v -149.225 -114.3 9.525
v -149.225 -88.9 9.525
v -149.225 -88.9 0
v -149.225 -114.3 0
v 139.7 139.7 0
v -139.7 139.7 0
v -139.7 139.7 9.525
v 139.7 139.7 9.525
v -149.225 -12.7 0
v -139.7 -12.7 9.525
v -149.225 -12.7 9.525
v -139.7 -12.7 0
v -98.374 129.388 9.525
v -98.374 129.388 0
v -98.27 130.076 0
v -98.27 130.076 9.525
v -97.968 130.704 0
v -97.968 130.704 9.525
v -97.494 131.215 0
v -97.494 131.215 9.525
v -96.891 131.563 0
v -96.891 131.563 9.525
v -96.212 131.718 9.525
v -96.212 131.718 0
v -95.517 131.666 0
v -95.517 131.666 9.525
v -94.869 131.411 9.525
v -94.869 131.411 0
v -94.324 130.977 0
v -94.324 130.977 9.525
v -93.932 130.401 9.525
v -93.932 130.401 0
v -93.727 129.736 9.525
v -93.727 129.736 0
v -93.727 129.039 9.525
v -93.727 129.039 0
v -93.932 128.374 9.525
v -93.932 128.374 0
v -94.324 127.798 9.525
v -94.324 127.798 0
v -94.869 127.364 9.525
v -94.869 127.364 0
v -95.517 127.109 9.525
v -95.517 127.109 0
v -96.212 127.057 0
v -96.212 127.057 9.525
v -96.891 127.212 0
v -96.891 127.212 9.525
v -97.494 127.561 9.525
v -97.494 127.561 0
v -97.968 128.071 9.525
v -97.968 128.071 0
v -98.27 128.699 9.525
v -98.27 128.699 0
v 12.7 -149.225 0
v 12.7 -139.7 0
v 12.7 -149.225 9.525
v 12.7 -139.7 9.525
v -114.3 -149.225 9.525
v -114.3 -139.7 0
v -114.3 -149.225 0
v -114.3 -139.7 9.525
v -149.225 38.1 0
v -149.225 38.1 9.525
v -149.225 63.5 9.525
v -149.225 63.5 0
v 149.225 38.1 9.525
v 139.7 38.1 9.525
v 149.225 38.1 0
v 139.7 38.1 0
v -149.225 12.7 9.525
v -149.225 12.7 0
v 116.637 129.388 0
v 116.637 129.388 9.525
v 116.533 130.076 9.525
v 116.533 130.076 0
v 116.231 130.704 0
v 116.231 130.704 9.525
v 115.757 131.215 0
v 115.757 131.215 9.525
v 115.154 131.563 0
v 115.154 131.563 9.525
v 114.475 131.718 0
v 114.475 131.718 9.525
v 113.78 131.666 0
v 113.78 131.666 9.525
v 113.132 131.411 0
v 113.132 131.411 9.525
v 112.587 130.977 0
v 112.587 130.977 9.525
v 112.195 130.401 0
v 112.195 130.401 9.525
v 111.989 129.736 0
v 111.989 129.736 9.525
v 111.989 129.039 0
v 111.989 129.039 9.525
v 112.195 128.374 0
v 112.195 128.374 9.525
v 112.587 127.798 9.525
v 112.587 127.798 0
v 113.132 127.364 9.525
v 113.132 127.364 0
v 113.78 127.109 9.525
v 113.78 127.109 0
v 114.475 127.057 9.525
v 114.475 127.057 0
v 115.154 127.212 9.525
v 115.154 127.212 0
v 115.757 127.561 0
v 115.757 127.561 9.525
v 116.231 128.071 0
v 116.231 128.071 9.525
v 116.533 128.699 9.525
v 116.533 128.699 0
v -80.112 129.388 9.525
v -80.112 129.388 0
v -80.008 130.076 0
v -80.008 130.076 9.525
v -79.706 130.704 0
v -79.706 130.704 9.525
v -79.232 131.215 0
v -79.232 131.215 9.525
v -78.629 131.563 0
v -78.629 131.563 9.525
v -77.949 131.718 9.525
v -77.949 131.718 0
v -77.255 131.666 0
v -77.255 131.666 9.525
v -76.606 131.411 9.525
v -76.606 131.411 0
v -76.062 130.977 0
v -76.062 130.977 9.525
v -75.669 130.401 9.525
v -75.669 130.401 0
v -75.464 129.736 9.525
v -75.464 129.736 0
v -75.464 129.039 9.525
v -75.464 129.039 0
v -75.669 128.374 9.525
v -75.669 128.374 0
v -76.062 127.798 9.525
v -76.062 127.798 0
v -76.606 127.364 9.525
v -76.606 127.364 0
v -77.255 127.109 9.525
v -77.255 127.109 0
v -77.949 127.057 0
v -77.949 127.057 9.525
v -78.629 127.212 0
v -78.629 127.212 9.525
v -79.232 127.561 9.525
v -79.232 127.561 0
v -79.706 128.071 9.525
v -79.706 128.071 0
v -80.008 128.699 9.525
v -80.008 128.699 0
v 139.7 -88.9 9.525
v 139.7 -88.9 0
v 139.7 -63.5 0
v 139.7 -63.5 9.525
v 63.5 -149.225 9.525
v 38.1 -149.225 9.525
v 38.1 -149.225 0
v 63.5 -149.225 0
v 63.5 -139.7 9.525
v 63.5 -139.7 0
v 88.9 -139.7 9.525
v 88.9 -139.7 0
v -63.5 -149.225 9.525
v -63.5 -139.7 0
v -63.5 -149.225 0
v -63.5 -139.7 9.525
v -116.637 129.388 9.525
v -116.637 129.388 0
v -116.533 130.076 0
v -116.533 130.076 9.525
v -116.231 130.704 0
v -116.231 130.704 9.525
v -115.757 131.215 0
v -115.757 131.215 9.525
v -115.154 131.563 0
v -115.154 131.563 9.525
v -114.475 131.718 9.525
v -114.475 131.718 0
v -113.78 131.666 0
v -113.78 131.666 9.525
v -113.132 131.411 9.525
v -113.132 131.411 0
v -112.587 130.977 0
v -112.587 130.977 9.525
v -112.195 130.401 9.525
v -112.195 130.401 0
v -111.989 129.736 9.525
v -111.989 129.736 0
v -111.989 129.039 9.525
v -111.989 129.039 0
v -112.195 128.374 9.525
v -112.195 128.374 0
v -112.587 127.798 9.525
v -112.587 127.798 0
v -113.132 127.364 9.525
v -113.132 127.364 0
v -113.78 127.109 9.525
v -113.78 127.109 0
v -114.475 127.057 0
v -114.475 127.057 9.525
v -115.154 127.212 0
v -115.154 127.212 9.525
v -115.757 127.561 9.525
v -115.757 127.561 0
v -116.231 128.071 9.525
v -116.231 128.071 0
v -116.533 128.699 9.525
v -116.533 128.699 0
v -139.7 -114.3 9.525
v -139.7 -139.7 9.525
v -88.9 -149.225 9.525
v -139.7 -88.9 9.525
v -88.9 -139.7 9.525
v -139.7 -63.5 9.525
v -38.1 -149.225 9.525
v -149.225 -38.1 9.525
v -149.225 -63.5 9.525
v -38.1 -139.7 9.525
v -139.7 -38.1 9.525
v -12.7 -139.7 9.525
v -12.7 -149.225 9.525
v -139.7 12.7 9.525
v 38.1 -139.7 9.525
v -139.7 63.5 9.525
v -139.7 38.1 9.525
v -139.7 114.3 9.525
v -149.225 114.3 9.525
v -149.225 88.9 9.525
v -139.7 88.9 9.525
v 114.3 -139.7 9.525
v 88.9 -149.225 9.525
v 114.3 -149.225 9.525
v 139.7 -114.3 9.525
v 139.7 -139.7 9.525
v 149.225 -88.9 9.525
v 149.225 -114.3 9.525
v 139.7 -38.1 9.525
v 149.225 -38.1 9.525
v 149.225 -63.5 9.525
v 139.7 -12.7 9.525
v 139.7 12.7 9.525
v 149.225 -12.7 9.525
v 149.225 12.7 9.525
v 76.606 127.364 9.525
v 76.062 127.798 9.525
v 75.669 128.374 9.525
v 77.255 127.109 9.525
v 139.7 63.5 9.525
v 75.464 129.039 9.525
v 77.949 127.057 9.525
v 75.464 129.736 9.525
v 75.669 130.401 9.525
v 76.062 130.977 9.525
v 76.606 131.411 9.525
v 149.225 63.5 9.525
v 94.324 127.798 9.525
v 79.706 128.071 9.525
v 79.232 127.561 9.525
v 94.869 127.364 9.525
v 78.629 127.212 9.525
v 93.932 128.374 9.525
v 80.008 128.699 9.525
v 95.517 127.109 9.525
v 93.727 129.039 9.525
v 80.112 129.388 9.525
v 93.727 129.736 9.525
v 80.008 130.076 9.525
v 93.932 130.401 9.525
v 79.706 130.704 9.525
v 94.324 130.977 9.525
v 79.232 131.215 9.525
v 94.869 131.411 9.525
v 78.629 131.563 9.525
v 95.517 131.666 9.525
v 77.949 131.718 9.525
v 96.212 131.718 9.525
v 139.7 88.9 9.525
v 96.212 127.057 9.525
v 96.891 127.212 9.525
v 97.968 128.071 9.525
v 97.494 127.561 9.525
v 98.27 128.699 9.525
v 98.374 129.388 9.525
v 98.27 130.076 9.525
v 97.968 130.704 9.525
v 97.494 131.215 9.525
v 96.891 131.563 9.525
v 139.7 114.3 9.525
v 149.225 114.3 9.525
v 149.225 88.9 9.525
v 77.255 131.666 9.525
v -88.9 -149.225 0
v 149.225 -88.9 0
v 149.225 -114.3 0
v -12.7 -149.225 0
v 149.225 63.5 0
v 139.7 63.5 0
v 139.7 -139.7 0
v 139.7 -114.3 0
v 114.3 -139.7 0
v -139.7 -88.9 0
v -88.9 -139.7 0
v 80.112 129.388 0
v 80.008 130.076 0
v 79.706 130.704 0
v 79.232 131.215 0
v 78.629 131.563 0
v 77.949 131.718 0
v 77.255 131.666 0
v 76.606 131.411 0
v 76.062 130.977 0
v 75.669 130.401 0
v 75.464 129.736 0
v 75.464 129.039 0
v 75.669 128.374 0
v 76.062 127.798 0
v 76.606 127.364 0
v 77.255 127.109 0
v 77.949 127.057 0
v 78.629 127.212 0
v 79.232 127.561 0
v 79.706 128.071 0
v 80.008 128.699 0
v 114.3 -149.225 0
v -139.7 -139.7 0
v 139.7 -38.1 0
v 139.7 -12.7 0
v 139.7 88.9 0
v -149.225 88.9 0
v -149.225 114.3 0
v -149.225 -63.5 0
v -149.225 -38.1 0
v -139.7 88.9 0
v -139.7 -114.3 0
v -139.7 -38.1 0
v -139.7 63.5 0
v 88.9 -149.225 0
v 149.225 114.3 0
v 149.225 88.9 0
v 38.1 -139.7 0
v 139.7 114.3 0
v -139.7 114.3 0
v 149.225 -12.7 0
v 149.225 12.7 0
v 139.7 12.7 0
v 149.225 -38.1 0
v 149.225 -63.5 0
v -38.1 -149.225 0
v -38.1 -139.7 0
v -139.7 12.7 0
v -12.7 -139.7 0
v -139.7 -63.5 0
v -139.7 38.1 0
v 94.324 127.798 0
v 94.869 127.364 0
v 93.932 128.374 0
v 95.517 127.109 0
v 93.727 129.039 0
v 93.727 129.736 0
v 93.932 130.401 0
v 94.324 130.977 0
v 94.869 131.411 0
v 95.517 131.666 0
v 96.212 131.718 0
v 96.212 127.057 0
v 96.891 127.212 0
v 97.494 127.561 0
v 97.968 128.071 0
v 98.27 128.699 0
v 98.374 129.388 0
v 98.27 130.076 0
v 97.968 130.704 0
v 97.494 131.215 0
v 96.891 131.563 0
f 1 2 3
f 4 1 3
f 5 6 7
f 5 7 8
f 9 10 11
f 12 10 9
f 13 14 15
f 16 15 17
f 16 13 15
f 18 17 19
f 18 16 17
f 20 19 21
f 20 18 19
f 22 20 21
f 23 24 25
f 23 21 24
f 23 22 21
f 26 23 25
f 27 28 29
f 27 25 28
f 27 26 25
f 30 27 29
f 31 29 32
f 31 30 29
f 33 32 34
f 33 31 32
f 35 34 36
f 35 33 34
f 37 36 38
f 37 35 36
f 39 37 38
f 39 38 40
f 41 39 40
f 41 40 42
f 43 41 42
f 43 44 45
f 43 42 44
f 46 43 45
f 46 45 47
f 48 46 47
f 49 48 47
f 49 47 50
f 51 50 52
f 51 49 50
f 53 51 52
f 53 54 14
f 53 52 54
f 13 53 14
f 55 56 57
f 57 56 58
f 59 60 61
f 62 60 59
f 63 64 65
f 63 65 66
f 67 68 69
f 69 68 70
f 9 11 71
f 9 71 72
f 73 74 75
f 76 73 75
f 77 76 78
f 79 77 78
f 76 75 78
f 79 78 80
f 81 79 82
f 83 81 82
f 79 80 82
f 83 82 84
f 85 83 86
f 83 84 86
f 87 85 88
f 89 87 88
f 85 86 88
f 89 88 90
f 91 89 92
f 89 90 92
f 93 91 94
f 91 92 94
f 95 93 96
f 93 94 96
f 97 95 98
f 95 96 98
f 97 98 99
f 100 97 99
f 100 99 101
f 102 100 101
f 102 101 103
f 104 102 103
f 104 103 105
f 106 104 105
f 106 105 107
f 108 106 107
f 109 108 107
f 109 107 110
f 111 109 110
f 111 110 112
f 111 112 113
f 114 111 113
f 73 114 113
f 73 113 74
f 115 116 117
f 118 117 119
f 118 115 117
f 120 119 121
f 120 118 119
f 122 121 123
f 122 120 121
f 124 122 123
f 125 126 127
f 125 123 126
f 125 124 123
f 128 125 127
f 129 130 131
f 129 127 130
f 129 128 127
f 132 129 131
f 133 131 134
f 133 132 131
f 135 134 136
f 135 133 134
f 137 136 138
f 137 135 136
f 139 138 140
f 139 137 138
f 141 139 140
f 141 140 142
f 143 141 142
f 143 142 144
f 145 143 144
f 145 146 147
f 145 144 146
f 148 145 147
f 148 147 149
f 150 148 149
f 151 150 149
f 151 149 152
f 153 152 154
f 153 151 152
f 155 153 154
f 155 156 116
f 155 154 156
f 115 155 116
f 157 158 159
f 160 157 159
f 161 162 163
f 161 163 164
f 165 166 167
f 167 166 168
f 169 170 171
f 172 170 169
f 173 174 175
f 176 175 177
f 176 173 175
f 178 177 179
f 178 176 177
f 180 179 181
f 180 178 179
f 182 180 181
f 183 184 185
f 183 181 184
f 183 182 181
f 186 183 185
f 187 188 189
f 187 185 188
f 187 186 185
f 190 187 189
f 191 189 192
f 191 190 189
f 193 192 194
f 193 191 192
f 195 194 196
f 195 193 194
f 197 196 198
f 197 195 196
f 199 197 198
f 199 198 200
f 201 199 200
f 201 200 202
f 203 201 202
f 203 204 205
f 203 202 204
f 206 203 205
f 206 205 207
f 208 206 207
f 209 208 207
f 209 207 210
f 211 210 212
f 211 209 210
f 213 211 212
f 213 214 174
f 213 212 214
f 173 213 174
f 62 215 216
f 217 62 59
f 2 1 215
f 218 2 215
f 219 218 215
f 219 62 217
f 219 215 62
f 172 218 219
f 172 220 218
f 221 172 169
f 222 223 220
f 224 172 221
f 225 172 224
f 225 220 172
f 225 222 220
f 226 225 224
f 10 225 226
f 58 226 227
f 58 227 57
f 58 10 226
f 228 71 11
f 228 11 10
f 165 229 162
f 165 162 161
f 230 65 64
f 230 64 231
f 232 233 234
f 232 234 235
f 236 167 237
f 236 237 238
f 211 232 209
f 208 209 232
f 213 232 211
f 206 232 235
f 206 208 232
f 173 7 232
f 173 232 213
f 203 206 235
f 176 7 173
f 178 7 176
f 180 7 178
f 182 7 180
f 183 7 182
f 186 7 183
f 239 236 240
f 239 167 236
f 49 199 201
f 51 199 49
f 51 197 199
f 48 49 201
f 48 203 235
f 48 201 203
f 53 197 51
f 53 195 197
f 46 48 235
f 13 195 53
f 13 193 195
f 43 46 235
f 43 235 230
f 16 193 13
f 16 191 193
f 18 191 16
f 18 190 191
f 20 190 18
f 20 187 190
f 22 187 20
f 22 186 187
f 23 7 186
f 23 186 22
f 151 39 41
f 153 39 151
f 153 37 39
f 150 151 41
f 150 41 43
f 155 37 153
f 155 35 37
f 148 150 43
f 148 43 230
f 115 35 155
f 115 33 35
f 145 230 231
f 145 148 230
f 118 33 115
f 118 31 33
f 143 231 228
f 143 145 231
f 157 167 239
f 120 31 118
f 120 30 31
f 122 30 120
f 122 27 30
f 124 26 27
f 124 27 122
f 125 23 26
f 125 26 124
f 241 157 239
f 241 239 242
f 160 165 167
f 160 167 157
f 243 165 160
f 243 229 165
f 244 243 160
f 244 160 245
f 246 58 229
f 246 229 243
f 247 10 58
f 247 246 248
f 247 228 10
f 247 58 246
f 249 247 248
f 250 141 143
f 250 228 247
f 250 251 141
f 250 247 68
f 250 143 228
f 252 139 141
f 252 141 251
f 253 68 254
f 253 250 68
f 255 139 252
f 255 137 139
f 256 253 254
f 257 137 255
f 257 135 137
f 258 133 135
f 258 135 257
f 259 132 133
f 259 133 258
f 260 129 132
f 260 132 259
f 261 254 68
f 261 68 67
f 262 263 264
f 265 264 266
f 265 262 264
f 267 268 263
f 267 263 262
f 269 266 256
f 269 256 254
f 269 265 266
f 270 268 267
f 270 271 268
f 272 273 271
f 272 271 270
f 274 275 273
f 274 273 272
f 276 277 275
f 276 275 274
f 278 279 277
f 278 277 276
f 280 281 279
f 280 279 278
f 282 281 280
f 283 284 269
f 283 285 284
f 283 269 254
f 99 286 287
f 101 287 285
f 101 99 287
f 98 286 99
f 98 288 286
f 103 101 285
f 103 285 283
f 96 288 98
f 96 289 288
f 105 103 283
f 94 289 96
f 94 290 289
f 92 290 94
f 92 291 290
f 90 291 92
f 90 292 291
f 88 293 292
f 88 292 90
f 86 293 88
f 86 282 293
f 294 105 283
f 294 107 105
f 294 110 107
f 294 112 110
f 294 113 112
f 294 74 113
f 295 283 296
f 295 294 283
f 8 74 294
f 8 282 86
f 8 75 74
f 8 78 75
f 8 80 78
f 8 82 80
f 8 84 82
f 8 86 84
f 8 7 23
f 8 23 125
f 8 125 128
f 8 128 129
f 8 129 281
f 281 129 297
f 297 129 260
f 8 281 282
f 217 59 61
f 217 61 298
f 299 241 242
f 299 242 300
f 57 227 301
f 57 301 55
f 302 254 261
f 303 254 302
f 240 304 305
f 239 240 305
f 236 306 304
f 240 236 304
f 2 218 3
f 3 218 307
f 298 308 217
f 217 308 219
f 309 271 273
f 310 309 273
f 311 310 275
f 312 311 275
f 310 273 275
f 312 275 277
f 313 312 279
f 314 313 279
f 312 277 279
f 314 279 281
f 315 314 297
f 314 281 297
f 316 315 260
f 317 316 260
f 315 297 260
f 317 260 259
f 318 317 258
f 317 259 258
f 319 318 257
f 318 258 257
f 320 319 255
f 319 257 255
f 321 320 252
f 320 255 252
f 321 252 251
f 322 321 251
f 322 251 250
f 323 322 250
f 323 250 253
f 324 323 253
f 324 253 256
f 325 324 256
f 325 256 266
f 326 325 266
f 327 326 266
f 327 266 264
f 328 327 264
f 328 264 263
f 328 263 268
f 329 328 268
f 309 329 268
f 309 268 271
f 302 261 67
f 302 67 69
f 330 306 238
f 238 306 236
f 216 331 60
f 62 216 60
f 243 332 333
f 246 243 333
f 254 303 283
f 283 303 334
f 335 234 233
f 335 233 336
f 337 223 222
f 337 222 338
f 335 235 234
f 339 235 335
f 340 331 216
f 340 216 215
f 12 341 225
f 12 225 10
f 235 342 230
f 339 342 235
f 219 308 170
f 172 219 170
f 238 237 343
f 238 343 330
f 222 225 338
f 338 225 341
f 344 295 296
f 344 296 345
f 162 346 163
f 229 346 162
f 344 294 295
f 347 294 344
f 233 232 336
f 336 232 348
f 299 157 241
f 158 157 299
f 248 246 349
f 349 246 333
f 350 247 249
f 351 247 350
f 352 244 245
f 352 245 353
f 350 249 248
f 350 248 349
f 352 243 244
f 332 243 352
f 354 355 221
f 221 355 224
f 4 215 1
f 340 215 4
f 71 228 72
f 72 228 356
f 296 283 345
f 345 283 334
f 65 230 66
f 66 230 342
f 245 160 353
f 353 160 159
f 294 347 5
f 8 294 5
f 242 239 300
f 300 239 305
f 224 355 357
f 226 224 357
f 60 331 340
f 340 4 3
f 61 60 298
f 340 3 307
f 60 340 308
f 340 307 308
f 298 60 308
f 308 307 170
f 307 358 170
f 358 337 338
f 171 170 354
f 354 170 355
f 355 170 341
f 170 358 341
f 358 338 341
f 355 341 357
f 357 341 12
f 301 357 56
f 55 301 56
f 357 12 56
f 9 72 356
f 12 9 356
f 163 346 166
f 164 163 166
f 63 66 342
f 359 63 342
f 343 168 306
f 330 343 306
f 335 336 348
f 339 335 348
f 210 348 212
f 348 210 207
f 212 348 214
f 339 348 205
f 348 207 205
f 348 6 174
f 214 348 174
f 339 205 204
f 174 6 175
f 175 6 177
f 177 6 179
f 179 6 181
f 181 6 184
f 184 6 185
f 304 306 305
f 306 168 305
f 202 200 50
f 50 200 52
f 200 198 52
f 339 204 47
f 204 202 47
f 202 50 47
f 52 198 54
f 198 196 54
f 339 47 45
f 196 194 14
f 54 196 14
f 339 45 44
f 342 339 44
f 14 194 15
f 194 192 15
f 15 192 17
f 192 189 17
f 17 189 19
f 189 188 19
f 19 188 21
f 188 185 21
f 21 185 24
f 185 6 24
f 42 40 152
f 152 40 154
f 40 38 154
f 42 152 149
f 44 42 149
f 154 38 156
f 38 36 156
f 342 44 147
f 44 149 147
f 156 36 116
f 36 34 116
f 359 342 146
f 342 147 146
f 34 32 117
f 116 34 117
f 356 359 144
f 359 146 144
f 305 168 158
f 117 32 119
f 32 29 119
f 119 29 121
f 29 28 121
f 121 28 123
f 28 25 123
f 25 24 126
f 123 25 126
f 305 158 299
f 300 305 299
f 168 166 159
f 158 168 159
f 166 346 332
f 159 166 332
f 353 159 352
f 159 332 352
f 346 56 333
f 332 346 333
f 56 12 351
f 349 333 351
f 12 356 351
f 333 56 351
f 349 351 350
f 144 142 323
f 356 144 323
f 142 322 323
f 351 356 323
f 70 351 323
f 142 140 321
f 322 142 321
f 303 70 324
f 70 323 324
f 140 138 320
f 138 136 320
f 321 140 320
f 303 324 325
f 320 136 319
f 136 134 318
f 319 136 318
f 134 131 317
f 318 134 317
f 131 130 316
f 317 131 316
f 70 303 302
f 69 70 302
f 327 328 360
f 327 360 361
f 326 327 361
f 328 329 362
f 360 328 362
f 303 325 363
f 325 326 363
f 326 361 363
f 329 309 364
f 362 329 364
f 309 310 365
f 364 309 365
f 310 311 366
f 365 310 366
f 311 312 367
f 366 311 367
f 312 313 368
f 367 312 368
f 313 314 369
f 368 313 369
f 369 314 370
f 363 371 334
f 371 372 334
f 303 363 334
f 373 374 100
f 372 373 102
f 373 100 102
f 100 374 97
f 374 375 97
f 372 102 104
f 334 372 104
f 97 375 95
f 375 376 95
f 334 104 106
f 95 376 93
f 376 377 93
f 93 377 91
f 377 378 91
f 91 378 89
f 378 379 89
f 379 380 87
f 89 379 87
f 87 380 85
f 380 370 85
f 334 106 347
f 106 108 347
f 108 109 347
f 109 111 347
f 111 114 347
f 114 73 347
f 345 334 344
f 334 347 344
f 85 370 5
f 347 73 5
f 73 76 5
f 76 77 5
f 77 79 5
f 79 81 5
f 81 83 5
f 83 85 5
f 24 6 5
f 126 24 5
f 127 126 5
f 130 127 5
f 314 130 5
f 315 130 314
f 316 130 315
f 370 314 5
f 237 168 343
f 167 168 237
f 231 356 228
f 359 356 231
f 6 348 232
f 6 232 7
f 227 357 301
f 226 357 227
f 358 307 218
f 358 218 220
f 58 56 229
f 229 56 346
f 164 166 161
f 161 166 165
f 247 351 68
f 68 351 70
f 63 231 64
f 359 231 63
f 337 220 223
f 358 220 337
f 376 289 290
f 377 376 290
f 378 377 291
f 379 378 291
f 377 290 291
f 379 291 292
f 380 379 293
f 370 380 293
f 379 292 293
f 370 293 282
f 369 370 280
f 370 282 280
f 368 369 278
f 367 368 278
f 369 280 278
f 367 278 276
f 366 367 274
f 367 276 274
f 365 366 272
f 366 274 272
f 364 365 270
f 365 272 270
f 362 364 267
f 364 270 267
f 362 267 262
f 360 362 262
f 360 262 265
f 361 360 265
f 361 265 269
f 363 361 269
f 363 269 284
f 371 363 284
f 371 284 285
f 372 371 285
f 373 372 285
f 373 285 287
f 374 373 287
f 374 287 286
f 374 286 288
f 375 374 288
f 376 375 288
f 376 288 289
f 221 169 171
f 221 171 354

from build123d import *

# Parameters (mm, degrees)
SKETCH2_W               = 279.4
SKETCH2_H               = 279.4
BOSS_EXTRUDE1_DEPTH     = 9.525
SKETCH4_W               = 9.525
SKETCH4_H               = 25.4
BOSS_EXTRUDE3_DEPTH     = 9.525
LPATTERN2_COUNT         = 5
LPATTERN2_PITCH         = 50.8
MIRROR2_COPY_1_SKETCH_W = 9.525
MIRROR2_COPY_1_SKETCH_H = 25.4
MIRROR2_COPY_1_DEPTH    = 9.525
MIRROR2_COPY_2_SKETCH_W = 9.525
MIRROR2_COPY_2_SKETCH_H = 25.4
MIRROR2_COPY_2_DEPTH    = 9.525
MIRROR2_COPY_3_SKETCH_W = 9.525
MIRROR2_COPY_3_SKETCH_H = 25.4
MIRROR2_COPY_3_DEPTH    = 9.525
MIRROR2_COPY_4_SKETCH_W = 9.525
MIRROR2_COPY_4_SKETCH_H = 25.4
MIRROR2_COPY_4_DEPTH    = 9.525
SKETCH5_W               = 25.4
SKETCH5_H               = 9.525
BOSS_EXTRUDE4_DEPTH     = 9.525
LPATTERN3_COUNT         = 5
LPATTERN3_PITCH         = 50.8
SKETCH6_R               = 2.3368
CUT_EXTRUDE1_DEPTH      = 10.525


with BuildPart() as part:
    # Sketch2 → Boss-Extrude1 (new body)
    with BuildSketch(Plane.XY):
        Rectangle(SKETCH2_W, SKETCH2_H)
    extrude(amount=BOSS_EXTRUDE1_DEPTH)

    # Sketch4 → Boss-Extrude3 (add)
    with BuildSketch(Plane(origin=(139.7, 0, 0), x_dir=(0, 0, -1), z_dir=(1, 0, 0))):
        with Locations((-4.7625, -101.6)):
            Rectangle(SKETCH4_W, SKETCH4_H)
    boss_extrude3 = extrude(amount=BOSS_EXTRUDE3_DEPTH)

    # LPattern2: Boss-Extrude3 ×5
    with Locations(*[(0, i * LPATTERN2_PITCH, 0) for i in range(1, LPATTERN2_COUNT)]):
        add(boss_extrude3)

    # Mirror2: Boss-Extrude3 across plane
    add(boss_extrude3.mirror(Plane(origin=(0, 0, 0), x_dir=(0, 0, 1), z_dir=(1, 0, 0))))

    # Mirror2 copy 1 sketch → Mirror2 copy 1 (add)
    with BuildSketch(Plane(origin=(-139.7, 50.8, 0), x_dir=(0, 0, -1), z_dir=(-1, 0, 0))):
        with Locations((-4.7625, 101.6)):
            Rectangle(MIRROR2_COPY_1_SKETCH_W, MIRROR2_COPY_1_SKETCH_H)
    extrude(amount=MIRROR2_COPY_1_DEPTH)

    # Mirror2 copy 2 sketch → Mirror2 copy 2 (add)
    with BuildSketch(Plane(origin=(-139.7, 101.6, 0), x_dir=(0, 0, -1), z_dir=(-1, 0, 0))):
        with Locations((-4.7625, 101.6)):
            Rectangle(MIRROR2_COPY_2_SKETCH_W, MIRROR2_COPY_2_SKETCH_H)
    extrude(amount=MIRROR2_COPY_2_DEPTH)

    # Mirror2 copy 3 sketch → Mirror2 copy 3 (add)
    with BuildSketch(Plane(origin=(-139.7, 152.4, 0), x_dir=(0, 0, -1), z_dir=(-1, 0, 0))):
        with Locations((-4.7625, 101.6)):
            Rectangle(MIRROR2_COPY_3_SKETCH_W, MIRROR2_COPY_3_SKETCH_H)
    extrude(amount=MIRROR2_COPY_3_DEPTH)

    # Mirror2 copy 4 sketch → Mirror2 copy 4 (add)
    with BuildSketch(Plane(origin=(-139.7, 203.2, 0), x_dir=(0, 0, -1), z_dir=(-1, 0, 0))):
        with Locations((-4.7625, 101.6)):
            Rectangle(MIRROR2_COPY_4_SKETCH_W, MIRROR2_COPY_4_SKETCH_H)
    extrude(amount=MIRROR2_COPY_4_DEPTH)

    # Sketch5 → Boss-Extrude4 (add)
    with BuildSketch(Plane.XZ.offset(139.7)):
        with Locations((-101.6, 4.7625)):
            Rectangle(SKETCH5_W, SKETCH5_H)
    boss_extrude4 = extrude(amount=BOSS_EXTRUDE4_DEPTH)

    # LPattern3: Boss-Extrude4 ×5
    with Locations(*[(i * LPATTERN3_PITCH, 0, 0) for i in range(1, LPATTERN3_COUNT)]):
        add(boss_extrude4)

    # Sketch6 → Cut-Extrude1 (cut, through all)
    with BuildSketch(Plane.XY.offset(9.525)):
        with Locations((114.3, 129.3876)):
            Circle(SKETCH6_R)
        with Locations((77.7748, 129.3876)):
            Circle(SKETCH6_R)
        with Locations((96.0374, 129.3876)):
            Circle(SKETCH6_R)
    cut_extrude1 = extrude(amount=-CUT_EXTRUDE1_DEPTH, mode=Mode.SUBTRACT)

    # Mirror3: Cut-Extrude1 across plane
    add(cut_extrude1.mirror(Plane(origin=(0, 0, 0), x_dir=(0, 0, 1), z_dir=(1, 0, 0))), mode=Mode.SUBTRACT)


solid = part.part
